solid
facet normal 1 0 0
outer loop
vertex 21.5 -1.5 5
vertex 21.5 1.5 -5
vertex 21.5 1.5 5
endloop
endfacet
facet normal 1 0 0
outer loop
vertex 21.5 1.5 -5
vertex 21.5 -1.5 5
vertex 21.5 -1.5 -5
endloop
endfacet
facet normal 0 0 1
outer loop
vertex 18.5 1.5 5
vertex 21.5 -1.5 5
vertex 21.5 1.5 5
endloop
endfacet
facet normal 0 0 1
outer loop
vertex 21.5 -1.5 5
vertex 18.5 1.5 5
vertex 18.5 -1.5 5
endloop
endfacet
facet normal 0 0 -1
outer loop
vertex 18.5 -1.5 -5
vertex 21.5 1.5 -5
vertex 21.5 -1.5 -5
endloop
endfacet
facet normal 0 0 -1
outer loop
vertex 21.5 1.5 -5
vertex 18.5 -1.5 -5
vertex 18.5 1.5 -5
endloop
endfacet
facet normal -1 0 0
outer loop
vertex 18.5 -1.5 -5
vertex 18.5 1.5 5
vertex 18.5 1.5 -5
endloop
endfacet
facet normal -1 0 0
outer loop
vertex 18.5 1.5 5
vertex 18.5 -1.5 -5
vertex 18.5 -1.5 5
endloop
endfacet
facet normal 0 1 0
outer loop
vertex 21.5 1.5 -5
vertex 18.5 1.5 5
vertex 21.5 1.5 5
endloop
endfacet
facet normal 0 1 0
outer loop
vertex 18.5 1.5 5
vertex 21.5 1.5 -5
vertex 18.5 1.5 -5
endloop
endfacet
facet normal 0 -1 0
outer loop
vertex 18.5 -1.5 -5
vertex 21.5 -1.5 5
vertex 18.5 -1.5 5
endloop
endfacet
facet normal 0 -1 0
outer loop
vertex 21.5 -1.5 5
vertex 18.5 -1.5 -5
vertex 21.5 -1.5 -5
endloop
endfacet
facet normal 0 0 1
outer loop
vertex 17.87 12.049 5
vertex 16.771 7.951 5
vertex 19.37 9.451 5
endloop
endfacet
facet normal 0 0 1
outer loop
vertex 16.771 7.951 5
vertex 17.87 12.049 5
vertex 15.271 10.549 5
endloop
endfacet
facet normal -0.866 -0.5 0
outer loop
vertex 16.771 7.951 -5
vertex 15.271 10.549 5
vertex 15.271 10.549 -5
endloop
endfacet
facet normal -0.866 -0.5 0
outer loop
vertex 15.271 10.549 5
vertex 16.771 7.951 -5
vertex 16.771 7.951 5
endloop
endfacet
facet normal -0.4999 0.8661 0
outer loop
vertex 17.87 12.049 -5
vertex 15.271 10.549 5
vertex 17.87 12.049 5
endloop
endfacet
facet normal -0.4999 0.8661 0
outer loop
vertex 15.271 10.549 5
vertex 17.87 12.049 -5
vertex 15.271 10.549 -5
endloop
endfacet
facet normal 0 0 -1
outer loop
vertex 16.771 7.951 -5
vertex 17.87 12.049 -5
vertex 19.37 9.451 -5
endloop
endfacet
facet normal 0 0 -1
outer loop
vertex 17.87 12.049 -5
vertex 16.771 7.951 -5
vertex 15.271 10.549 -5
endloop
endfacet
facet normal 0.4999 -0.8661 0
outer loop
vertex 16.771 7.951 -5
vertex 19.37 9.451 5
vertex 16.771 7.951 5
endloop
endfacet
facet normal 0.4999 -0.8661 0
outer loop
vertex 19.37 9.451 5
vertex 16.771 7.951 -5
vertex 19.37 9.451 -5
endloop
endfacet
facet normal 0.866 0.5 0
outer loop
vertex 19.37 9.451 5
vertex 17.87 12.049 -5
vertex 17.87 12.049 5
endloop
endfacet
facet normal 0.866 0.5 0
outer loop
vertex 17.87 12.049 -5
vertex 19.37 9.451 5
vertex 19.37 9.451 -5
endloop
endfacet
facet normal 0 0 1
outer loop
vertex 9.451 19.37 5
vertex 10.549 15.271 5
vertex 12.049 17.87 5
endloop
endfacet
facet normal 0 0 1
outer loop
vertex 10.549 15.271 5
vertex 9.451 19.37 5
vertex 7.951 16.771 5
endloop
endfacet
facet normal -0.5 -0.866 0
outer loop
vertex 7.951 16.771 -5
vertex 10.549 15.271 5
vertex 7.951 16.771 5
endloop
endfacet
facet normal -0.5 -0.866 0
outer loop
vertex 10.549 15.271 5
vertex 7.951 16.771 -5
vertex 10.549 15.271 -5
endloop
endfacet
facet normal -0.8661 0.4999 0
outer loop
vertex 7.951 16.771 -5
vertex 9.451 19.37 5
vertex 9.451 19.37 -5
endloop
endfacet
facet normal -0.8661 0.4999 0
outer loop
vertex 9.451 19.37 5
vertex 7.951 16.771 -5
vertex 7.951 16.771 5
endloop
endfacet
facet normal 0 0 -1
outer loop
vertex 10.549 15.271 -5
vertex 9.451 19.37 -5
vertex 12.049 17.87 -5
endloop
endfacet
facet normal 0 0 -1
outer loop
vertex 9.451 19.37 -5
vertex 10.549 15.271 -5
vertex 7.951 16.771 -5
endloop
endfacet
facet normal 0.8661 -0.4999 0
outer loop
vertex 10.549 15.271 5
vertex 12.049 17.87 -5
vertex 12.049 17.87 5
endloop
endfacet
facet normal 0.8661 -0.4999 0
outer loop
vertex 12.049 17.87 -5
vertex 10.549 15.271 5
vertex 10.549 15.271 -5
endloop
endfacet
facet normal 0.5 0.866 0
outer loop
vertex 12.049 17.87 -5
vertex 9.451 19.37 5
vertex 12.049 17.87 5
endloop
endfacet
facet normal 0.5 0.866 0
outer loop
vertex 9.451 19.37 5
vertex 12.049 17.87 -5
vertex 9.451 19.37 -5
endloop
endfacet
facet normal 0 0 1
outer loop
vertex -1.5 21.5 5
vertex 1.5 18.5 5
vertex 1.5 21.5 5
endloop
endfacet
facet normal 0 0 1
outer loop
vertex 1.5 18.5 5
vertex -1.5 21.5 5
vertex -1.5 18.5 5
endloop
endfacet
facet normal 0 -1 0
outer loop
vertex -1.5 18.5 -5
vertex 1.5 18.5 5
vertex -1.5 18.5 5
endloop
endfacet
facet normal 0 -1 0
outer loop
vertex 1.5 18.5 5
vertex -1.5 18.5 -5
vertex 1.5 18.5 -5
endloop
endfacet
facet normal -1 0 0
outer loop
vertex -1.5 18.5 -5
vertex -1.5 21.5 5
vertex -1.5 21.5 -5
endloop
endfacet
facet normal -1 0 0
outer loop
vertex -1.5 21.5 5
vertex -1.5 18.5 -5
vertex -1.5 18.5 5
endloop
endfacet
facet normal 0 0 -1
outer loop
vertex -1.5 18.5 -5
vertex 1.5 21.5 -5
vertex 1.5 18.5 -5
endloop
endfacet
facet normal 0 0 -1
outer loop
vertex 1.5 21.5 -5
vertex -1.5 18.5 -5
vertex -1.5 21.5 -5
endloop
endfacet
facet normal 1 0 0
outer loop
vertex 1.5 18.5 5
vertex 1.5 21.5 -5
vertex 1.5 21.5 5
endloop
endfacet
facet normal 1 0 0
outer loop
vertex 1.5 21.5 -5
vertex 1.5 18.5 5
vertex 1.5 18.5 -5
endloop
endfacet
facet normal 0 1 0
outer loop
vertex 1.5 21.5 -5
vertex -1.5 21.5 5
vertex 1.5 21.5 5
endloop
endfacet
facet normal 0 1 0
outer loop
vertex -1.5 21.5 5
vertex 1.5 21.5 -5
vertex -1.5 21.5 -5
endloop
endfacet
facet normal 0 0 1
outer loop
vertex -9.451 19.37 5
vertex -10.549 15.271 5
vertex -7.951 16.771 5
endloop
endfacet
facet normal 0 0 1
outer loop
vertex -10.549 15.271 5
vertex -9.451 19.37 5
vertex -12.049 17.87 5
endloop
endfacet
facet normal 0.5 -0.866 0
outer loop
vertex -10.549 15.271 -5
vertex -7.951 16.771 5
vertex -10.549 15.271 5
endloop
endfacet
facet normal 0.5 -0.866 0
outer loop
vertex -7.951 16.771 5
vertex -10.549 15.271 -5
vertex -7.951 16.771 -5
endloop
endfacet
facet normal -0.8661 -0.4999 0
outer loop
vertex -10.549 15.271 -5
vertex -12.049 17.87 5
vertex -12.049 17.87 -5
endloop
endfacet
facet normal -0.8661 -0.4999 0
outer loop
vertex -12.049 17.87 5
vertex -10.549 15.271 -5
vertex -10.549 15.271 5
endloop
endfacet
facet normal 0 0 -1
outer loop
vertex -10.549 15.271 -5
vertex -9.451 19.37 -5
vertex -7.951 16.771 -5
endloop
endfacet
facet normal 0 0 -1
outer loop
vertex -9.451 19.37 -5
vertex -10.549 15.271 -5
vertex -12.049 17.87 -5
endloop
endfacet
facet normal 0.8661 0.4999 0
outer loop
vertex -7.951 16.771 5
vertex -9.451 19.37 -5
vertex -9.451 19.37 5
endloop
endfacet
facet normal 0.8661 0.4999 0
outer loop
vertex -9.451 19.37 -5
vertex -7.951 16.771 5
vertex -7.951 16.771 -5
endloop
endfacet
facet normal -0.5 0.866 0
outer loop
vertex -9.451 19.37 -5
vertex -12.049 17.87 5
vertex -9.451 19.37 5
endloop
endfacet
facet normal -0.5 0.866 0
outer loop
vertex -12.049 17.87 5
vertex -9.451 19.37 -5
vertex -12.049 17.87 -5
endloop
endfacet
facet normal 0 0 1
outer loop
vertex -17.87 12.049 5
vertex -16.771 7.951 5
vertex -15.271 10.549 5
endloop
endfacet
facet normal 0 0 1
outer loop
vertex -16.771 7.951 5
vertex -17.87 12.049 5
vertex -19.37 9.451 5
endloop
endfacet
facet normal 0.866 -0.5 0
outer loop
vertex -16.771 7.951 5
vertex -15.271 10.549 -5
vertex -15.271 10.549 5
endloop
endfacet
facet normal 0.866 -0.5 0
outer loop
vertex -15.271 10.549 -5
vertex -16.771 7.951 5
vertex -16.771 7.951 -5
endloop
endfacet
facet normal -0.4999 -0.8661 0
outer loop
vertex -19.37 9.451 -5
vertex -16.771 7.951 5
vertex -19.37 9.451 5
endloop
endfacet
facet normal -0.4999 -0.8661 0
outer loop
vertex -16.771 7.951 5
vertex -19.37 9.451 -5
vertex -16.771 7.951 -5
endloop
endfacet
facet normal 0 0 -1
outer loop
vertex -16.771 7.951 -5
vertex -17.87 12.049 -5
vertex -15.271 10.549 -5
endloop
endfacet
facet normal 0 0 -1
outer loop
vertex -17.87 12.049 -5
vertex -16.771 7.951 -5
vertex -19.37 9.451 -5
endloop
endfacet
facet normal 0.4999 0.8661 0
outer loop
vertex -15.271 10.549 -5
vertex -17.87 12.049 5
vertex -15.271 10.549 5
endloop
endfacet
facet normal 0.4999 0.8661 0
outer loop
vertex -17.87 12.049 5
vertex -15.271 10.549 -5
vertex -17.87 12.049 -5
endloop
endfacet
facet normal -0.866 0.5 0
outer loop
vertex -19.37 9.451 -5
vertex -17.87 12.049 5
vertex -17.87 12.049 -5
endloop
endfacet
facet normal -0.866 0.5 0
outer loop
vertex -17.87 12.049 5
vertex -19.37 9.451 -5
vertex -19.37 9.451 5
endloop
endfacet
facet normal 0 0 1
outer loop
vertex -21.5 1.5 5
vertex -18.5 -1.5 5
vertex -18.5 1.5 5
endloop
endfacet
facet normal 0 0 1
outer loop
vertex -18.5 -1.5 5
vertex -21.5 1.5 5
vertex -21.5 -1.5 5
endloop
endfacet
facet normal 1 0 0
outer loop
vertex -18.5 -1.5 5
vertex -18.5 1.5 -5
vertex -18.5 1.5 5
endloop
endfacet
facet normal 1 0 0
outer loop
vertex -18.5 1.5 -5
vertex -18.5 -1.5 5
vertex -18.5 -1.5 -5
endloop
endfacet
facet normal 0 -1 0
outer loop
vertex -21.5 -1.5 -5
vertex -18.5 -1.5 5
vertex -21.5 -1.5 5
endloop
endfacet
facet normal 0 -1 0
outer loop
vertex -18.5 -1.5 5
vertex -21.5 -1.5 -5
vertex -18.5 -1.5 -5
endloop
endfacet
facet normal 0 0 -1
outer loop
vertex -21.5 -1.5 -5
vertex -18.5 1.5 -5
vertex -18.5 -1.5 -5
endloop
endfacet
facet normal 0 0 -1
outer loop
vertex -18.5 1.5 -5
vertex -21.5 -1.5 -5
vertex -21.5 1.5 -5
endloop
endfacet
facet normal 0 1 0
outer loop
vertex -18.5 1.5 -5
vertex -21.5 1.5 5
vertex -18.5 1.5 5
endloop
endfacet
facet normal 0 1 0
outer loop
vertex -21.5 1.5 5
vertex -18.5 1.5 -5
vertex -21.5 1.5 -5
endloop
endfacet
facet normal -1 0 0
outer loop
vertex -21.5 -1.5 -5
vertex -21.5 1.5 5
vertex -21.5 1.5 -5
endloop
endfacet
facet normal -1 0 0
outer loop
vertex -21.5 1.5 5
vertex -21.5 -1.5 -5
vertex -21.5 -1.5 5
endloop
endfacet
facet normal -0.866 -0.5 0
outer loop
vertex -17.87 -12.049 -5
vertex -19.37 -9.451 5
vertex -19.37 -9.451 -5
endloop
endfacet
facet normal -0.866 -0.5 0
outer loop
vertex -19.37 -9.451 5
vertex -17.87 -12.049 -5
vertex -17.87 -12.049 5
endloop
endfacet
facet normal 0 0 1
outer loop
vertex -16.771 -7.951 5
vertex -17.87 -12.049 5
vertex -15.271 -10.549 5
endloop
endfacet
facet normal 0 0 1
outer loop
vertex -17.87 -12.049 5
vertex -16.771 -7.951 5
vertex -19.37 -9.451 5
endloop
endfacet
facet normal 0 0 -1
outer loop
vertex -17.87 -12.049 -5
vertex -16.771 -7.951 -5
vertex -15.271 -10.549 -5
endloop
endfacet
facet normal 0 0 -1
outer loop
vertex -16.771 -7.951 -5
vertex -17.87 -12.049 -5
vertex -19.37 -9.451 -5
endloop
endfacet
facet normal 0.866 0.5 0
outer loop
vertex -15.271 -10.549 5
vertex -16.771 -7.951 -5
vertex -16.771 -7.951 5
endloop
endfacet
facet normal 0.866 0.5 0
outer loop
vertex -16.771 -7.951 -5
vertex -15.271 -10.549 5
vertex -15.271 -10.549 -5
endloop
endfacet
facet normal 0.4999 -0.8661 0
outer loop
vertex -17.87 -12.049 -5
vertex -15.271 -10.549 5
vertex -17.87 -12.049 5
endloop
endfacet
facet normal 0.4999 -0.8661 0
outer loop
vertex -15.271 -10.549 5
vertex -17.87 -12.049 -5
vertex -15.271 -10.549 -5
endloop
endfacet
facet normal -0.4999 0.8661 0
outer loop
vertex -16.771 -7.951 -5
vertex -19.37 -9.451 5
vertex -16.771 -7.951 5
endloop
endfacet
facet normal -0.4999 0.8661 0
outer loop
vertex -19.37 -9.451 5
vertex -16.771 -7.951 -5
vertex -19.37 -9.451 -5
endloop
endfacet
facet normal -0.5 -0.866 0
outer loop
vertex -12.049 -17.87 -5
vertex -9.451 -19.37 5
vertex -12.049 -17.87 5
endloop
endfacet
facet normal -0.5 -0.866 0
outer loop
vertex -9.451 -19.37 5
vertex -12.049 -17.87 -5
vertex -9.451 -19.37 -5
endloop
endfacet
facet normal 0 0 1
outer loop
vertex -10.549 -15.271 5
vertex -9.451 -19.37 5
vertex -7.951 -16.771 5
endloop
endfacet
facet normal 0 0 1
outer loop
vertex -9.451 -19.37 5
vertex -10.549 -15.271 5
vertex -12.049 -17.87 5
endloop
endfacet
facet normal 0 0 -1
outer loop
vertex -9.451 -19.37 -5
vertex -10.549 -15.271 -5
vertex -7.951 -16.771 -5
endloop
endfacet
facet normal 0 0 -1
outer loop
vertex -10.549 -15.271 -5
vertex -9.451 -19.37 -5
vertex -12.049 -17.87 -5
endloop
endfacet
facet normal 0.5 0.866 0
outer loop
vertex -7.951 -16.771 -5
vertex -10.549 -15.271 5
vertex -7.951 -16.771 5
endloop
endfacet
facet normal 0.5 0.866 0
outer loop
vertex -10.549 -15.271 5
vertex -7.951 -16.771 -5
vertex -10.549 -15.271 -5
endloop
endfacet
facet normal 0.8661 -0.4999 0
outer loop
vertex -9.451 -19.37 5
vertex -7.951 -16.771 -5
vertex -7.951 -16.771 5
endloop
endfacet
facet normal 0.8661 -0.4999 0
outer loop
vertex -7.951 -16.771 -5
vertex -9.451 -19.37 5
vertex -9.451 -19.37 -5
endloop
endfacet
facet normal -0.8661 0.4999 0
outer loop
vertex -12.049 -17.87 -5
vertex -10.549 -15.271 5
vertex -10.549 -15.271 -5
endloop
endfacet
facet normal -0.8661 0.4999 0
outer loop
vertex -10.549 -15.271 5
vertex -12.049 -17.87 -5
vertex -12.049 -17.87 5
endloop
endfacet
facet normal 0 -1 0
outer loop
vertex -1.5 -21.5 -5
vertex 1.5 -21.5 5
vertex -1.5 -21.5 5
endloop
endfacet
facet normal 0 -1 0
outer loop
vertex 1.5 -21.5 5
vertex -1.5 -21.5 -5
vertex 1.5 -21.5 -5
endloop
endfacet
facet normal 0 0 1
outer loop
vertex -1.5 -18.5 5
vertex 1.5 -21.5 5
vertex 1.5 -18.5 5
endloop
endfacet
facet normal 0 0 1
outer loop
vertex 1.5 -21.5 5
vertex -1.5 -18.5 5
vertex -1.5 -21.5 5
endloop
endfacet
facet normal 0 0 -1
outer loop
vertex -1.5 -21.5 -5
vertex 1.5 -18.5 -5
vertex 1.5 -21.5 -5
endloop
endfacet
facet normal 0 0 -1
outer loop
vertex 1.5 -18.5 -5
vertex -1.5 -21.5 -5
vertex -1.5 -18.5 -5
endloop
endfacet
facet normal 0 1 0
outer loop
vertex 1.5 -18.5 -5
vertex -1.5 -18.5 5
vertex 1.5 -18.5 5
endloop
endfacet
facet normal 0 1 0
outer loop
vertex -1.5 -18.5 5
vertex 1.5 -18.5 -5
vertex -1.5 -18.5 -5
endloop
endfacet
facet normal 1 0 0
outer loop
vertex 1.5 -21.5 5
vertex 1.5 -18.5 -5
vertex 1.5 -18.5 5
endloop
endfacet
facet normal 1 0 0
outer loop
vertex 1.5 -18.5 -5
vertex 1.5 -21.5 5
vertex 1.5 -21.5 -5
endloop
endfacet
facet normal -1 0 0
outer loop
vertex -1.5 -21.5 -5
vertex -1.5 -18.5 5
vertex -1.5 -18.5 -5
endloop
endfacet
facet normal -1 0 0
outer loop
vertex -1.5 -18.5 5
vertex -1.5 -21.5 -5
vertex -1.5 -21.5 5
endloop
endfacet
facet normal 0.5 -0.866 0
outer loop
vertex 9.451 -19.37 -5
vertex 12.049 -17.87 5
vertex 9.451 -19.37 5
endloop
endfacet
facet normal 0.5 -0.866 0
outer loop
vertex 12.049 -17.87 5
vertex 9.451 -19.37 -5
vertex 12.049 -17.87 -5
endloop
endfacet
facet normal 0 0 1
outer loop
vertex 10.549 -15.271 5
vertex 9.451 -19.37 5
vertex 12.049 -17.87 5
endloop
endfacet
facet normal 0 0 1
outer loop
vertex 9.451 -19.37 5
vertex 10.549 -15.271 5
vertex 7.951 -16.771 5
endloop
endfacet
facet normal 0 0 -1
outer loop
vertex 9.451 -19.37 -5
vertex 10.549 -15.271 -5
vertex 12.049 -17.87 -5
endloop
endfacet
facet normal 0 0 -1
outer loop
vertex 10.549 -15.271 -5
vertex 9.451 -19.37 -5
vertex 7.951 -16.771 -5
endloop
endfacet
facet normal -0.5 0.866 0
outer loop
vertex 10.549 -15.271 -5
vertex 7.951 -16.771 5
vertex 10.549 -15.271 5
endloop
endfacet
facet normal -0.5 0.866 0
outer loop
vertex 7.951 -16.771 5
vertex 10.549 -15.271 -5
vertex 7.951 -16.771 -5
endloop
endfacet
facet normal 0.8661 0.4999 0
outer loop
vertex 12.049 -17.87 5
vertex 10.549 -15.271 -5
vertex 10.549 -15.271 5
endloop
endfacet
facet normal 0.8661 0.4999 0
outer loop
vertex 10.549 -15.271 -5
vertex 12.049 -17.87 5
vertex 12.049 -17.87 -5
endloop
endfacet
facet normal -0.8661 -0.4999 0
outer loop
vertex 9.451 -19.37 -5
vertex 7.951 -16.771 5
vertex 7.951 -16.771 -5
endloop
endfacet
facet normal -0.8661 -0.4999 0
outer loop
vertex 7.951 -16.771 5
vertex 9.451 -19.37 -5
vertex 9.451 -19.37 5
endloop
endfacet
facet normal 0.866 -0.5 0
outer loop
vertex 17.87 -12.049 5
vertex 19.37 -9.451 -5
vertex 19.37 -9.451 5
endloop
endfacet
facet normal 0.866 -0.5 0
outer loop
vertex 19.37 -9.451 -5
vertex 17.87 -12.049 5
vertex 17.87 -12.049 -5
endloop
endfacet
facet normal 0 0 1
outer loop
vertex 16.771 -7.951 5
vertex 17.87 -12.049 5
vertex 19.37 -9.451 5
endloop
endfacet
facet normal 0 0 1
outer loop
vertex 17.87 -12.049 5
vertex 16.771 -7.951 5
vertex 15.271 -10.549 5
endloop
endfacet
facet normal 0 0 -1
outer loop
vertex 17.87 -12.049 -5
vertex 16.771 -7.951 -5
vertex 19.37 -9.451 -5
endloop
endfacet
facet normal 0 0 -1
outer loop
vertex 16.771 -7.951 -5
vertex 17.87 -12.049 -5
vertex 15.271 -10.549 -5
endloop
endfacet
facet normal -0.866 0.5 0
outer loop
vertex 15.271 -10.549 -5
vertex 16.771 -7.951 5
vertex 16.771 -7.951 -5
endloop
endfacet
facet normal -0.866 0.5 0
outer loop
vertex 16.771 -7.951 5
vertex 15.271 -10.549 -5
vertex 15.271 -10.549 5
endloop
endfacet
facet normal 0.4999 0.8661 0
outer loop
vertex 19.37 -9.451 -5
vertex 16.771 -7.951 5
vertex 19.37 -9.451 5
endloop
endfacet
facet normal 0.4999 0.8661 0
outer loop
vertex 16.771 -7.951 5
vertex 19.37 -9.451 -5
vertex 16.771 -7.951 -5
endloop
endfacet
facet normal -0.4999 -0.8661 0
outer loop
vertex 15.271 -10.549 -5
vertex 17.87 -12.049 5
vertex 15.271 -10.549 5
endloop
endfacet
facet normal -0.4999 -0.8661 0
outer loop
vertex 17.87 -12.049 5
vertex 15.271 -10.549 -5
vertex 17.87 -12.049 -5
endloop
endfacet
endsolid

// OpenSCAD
// Circular Pattern
// Objects arranged in a circle

$fn = 30;
count = 12;
radius = 20;

for(i = [0:count-1]) {
    angle = i * (360/count);
    rotate([0, 0, angle])
        translate([radius, 0, 0])
            cube([3, 3, 10], center=true);
}
